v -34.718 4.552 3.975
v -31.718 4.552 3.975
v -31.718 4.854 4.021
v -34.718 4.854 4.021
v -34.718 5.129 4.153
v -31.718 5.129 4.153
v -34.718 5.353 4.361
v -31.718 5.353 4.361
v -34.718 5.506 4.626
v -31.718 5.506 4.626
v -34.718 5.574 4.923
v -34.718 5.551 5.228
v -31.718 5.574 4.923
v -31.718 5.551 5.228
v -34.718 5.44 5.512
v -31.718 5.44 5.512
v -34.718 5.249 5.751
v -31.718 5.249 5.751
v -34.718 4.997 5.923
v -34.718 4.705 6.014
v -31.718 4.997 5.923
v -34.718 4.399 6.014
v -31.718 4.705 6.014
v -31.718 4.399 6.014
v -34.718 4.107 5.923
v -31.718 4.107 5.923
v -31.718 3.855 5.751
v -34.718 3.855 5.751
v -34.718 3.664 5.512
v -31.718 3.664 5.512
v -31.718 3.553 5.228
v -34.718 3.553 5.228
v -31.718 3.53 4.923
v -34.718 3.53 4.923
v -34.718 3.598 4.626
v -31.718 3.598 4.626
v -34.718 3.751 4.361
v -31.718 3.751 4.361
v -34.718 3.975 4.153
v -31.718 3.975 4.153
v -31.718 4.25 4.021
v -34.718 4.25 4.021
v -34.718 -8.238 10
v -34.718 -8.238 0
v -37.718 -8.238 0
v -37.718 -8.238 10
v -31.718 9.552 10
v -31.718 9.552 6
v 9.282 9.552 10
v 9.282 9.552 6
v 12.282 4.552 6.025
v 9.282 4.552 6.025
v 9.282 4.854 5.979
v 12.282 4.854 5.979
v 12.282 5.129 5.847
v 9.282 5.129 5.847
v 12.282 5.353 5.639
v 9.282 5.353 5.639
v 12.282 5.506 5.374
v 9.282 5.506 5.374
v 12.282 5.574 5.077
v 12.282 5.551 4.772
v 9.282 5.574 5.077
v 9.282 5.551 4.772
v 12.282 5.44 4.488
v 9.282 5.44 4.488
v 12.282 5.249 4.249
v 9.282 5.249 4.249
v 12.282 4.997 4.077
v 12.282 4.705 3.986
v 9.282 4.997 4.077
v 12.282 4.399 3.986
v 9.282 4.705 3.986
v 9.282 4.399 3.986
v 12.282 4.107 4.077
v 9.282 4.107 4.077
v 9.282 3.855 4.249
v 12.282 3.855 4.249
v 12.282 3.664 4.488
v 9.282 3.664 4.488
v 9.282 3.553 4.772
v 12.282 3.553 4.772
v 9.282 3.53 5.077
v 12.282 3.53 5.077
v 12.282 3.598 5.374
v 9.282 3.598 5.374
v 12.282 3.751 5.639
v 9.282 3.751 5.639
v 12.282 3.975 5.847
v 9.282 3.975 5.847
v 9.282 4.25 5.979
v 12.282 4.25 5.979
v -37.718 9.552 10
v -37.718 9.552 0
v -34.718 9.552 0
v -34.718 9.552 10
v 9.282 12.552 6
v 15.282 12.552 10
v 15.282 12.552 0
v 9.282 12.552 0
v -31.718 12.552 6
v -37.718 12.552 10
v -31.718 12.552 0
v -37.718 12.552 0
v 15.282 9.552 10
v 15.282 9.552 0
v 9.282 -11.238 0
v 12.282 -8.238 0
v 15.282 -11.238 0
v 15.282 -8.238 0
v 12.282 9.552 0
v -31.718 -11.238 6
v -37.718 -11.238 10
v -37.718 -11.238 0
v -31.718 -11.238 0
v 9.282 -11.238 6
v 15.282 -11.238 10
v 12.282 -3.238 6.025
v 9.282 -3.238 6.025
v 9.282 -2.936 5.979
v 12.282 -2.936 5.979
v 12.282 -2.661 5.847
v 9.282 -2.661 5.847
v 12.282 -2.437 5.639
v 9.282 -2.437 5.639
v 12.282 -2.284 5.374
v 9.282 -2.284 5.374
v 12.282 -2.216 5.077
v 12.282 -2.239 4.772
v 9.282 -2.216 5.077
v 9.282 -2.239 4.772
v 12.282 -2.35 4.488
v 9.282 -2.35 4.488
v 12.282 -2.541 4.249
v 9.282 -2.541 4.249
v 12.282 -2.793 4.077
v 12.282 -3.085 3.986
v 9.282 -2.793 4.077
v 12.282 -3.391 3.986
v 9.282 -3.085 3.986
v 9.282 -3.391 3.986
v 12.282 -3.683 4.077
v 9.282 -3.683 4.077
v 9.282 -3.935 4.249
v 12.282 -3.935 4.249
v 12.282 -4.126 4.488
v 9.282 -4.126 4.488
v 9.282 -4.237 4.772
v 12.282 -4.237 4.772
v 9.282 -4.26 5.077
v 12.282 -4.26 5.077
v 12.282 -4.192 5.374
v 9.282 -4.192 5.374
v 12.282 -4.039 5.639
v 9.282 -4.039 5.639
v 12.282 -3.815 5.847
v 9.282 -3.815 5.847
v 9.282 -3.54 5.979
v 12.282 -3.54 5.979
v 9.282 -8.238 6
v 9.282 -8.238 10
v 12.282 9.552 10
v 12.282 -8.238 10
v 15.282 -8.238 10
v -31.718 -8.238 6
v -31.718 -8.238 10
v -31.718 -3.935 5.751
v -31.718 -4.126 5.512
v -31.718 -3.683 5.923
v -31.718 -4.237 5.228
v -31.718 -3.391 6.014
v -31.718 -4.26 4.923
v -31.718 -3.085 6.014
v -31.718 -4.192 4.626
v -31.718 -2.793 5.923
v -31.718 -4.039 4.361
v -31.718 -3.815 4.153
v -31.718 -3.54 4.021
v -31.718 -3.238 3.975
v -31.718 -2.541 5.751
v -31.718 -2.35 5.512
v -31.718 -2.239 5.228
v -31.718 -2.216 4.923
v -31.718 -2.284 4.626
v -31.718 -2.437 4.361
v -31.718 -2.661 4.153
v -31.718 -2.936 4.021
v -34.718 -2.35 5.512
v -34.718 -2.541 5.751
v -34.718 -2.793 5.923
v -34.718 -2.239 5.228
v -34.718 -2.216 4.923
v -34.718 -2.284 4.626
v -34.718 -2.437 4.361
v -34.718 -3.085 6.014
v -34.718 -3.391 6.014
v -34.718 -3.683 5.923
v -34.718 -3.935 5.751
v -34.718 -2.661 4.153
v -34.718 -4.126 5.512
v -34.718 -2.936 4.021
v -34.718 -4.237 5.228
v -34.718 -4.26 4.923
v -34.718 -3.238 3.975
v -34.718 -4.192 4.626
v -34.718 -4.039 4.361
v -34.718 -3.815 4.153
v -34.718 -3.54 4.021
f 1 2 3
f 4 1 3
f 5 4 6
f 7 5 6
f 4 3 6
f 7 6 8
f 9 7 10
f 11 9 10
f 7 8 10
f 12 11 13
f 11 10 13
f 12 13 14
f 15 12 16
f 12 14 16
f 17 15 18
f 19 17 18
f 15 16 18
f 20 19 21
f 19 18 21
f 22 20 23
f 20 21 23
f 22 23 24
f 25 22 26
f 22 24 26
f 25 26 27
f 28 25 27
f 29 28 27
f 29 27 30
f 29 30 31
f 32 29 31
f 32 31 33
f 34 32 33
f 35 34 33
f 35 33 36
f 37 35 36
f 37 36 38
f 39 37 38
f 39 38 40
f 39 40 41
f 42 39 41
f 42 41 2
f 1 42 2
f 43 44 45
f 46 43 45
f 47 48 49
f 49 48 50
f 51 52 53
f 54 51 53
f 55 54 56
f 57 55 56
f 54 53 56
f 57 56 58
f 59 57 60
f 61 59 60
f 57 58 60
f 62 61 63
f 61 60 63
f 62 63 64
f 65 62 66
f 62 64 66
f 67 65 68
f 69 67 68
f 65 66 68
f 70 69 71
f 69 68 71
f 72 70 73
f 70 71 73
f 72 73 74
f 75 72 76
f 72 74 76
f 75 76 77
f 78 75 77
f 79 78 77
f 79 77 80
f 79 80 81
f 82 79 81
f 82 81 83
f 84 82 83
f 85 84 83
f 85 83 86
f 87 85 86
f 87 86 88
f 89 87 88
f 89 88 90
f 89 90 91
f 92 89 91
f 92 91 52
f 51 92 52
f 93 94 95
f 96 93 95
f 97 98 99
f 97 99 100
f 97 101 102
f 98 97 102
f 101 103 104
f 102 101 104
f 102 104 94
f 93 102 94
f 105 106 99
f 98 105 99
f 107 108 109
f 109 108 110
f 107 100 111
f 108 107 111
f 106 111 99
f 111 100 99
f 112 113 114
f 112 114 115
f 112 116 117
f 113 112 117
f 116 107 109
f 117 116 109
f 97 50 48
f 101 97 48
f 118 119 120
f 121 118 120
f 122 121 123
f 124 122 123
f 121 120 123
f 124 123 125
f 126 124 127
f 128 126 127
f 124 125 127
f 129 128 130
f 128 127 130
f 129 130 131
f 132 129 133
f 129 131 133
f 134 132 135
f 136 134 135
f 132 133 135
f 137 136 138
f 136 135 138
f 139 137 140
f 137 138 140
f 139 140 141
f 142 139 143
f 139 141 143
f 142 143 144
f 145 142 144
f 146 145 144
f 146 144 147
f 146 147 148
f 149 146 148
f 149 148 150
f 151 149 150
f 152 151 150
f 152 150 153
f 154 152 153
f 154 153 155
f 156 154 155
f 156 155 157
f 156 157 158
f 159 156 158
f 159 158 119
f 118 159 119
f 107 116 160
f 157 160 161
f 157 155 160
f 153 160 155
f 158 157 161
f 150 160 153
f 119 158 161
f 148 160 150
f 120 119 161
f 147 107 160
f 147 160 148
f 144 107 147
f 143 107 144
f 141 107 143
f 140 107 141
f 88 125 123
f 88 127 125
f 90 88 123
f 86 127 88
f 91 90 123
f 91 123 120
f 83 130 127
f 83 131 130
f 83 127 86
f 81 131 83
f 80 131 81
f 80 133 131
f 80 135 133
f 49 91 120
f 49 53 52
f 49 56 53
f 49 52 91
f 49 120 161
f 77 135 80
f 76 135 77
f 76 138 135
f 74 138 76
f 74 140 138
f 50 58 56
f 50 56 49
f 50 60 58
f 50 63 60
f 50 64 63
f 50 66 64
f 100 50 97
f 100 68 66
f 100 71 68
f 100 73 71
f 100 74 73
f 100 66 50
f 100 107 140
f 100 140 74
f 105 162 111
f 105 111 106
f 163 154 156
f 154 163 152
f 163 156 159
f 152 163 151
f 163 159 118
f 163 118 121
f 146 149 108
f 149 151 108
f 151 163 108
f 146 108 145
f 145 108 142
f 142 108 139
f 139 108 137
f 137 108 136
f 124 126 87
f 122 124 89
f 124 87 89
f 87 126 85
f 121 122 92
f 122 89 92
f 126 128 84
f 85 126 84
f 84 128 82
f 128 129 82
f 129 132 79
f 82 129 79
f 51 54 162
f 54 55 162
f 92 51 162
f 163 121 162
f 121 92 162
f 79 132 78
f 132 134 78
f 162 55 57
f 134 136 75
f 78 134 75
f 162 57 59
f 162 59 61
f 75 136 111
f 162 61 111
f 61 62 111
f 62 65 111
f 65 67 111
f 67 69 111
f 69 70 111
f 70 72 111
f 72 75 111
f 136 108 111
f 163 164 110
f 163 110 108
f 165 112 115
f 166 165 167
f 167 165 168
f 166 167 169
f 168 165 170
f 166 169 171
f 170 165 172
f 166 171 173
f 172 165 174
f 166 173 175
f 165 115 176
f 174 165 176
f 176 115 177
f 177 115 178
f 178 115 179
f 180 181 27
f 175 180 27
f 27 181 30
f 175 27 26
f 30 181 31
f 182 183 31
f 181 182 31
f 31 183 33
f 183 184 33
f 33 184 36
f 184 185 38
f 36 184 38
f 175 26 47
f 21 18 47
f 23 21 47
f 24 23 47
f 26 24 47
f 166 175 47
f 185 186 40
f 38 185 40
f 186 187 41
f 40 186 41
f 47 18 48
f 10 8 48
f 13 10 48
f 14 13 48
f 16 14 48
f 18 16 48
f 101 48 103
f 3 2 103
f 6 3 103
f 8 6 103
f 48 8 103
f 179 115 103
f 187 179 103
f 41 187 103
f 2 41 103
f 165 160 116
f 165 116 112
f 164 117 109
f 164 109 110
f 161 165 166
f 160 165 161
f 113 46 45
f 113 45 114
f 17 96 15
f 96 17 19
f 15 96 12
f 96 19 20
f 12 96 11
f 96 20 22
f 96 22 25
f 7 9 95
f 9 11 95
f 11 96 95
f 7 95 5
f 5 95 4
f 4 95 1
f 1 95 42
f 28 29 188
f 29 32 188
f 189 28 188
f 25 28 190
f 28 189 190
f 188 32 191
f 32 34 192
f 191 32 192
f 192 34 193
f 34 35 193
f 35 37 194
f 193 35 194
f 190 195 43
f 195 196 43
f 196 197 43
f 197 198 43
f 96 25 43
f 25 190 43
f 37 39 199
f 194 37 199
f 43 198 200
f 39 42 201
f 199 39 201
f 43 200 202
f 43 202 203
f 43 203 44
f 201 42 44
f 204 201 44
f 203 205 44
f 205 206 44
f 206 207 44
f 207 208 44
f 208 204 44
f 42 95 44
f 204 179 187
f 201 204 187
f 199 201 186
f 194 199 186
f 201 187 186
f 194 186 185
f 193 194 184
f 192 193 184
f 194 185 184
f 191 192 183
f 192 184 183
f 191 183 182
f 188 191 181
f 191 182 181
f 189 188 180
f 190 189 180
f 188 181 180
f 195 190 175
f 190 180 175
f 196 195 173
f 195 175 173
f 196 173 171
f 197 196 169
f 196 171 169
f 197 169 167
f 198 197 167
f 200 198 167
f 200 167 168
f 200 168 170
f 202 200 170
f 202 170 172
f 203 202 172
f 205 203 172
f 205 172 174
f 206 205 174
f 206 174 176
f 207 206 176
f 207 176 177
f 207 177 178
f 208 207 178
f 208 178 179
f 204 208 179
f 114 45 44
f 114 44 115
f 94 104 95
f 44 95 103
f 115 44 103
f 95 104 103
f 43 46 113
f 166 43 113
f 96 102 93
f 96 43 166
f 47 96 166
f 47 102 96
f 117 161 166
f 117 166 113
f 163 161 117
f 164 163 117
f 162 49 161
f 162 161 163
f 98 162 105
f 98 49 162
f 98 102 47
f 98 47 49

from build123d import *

# Parameters (mm, degrees)
SKETCH1_W                    = 41
SKETCH1_H                    = 17.79
BOSS_EXTRUDE1_DEPTH          = 10
M2_5X0_45_TAPPED_HOLE2_D     = 2.05
M2_5X0_45_TAPPED_HOLE2_DEPTH = 7.25
M2_5X0_45_TAPPED_HOLE2_TIP   = 0.615882135
M2_5X0_45_TAPPED_HOLE1_D     = 2.05
M2_5X0_45_TAPPED_HOLE1_DEPTH = 7.25
M2_5X0_45_TAPPED_HOLE1_TIP   = 0.615882135
SKETCH10_W                   = 41
SKETCH10_H                   = 3
CUT_EXTRUDE1_DEPTH           = 6


with BuildPart() as part:
    # Sketch1 → Boss-Extrude1 (new body)
    with BuildSketch(Plane.XY):
        Polygon((12.281684518, 9.551958914), (15.281684518, 9.551958914), (15.281684518, 12.551958914), (-37.718315482, 12.551958914), (-37.718315482, 9.551958914), (-34.718315482, 9.551958914), (-34.718315482, -8.238041086), (-37.718315482, -8.238041086), (-37.718315482, -11.238041086), (15.281684518, -11.238041086), (15.281684518, -8.238041086), (12.281684518, -8.238041086), align=None)
        with Locations((-11.218315482, 0.656958914)):
            Rectangle(SKETCH1_W, SKETCH1_H, mode=Mode.SUBTRACT)
    extrude(amount=BOSS_EXTRUDE1_DEPTH)

    # M2.5x0.45 Tapped Hole2
    with Locations(Plane.ZY.offset(34.718315482)):
        with Locations((5, 4.551958914), (5, -3.238041086)):
            Hole(M2_5X0_45_TAPPED_HOLE2_D / 2, depth=M2_5X0_45_TAPPED_HOLE2_DEPTH)
            with Locations((0, 0, -(M2_5X0_45_TAPPED_HOLE2_DEPTH + M2_5X0_45_TAPPED_HOLE2_TIP / 2))):  # 118° drill point
                Cone(0, M2_5X0_45_TAPPED_HOLE2_D / 2, M2_5X0_45_TAPPED_HOLE2_TIP, mode=Mode.SUBTRACT)

    # M2.5x0.45 Tapped Hole1
    with Locations(Plane(origin=(12.281684518, 2.476678441, 1.606875776), x_dir=(0, 0, -1), z_dir=(1, 0, 0))):
        with Locations((-3.393124224, 2.075280473), (-3.393124224, -5.714719527)):
            Hole(M2_5X0_45_TAPPED_HOLE1_D / 2, depth=M2_5X0_45_TAPPED_HOLE1_DEPTH)
            with Locations((0, 0, -(M2_5X0_45_TAPPED_HOLE1_DEPTH + M2_5X0_45_TAPPED_HOLE1_TIP / 2))):  # 118° drill point
                Cone(0, M2_5X0_45_TAPPED_HOLE1_D / 2, M2_5X0_45_TAPPED_HOLE1_TIP, mode=Mode.SUBTRACT)

    # Sketch10 → Cut-Extrude1 (cut)
    with BuildSketch(Plane(origin=(0, 0, 0), x_dir=(-1, 0, 0), z_dir=(0, 0, -1))):
        with Locations((11.218315482, -9.738041086)):
            Rectangle(SKETCH10_W, SKETCH10_H)
    cut_extrude1 = extrude(amount=-CUT_EXTRUDE1_DEPTH, mode=Mode.SUBTRACT)

    # Mirror3: Cut-Extrude1 across plane
    add(cut_extrude1.mirror(Plane.ZX.offset(0.656958914)), mode=Mode.SUBTRACT)


solid = part.part
